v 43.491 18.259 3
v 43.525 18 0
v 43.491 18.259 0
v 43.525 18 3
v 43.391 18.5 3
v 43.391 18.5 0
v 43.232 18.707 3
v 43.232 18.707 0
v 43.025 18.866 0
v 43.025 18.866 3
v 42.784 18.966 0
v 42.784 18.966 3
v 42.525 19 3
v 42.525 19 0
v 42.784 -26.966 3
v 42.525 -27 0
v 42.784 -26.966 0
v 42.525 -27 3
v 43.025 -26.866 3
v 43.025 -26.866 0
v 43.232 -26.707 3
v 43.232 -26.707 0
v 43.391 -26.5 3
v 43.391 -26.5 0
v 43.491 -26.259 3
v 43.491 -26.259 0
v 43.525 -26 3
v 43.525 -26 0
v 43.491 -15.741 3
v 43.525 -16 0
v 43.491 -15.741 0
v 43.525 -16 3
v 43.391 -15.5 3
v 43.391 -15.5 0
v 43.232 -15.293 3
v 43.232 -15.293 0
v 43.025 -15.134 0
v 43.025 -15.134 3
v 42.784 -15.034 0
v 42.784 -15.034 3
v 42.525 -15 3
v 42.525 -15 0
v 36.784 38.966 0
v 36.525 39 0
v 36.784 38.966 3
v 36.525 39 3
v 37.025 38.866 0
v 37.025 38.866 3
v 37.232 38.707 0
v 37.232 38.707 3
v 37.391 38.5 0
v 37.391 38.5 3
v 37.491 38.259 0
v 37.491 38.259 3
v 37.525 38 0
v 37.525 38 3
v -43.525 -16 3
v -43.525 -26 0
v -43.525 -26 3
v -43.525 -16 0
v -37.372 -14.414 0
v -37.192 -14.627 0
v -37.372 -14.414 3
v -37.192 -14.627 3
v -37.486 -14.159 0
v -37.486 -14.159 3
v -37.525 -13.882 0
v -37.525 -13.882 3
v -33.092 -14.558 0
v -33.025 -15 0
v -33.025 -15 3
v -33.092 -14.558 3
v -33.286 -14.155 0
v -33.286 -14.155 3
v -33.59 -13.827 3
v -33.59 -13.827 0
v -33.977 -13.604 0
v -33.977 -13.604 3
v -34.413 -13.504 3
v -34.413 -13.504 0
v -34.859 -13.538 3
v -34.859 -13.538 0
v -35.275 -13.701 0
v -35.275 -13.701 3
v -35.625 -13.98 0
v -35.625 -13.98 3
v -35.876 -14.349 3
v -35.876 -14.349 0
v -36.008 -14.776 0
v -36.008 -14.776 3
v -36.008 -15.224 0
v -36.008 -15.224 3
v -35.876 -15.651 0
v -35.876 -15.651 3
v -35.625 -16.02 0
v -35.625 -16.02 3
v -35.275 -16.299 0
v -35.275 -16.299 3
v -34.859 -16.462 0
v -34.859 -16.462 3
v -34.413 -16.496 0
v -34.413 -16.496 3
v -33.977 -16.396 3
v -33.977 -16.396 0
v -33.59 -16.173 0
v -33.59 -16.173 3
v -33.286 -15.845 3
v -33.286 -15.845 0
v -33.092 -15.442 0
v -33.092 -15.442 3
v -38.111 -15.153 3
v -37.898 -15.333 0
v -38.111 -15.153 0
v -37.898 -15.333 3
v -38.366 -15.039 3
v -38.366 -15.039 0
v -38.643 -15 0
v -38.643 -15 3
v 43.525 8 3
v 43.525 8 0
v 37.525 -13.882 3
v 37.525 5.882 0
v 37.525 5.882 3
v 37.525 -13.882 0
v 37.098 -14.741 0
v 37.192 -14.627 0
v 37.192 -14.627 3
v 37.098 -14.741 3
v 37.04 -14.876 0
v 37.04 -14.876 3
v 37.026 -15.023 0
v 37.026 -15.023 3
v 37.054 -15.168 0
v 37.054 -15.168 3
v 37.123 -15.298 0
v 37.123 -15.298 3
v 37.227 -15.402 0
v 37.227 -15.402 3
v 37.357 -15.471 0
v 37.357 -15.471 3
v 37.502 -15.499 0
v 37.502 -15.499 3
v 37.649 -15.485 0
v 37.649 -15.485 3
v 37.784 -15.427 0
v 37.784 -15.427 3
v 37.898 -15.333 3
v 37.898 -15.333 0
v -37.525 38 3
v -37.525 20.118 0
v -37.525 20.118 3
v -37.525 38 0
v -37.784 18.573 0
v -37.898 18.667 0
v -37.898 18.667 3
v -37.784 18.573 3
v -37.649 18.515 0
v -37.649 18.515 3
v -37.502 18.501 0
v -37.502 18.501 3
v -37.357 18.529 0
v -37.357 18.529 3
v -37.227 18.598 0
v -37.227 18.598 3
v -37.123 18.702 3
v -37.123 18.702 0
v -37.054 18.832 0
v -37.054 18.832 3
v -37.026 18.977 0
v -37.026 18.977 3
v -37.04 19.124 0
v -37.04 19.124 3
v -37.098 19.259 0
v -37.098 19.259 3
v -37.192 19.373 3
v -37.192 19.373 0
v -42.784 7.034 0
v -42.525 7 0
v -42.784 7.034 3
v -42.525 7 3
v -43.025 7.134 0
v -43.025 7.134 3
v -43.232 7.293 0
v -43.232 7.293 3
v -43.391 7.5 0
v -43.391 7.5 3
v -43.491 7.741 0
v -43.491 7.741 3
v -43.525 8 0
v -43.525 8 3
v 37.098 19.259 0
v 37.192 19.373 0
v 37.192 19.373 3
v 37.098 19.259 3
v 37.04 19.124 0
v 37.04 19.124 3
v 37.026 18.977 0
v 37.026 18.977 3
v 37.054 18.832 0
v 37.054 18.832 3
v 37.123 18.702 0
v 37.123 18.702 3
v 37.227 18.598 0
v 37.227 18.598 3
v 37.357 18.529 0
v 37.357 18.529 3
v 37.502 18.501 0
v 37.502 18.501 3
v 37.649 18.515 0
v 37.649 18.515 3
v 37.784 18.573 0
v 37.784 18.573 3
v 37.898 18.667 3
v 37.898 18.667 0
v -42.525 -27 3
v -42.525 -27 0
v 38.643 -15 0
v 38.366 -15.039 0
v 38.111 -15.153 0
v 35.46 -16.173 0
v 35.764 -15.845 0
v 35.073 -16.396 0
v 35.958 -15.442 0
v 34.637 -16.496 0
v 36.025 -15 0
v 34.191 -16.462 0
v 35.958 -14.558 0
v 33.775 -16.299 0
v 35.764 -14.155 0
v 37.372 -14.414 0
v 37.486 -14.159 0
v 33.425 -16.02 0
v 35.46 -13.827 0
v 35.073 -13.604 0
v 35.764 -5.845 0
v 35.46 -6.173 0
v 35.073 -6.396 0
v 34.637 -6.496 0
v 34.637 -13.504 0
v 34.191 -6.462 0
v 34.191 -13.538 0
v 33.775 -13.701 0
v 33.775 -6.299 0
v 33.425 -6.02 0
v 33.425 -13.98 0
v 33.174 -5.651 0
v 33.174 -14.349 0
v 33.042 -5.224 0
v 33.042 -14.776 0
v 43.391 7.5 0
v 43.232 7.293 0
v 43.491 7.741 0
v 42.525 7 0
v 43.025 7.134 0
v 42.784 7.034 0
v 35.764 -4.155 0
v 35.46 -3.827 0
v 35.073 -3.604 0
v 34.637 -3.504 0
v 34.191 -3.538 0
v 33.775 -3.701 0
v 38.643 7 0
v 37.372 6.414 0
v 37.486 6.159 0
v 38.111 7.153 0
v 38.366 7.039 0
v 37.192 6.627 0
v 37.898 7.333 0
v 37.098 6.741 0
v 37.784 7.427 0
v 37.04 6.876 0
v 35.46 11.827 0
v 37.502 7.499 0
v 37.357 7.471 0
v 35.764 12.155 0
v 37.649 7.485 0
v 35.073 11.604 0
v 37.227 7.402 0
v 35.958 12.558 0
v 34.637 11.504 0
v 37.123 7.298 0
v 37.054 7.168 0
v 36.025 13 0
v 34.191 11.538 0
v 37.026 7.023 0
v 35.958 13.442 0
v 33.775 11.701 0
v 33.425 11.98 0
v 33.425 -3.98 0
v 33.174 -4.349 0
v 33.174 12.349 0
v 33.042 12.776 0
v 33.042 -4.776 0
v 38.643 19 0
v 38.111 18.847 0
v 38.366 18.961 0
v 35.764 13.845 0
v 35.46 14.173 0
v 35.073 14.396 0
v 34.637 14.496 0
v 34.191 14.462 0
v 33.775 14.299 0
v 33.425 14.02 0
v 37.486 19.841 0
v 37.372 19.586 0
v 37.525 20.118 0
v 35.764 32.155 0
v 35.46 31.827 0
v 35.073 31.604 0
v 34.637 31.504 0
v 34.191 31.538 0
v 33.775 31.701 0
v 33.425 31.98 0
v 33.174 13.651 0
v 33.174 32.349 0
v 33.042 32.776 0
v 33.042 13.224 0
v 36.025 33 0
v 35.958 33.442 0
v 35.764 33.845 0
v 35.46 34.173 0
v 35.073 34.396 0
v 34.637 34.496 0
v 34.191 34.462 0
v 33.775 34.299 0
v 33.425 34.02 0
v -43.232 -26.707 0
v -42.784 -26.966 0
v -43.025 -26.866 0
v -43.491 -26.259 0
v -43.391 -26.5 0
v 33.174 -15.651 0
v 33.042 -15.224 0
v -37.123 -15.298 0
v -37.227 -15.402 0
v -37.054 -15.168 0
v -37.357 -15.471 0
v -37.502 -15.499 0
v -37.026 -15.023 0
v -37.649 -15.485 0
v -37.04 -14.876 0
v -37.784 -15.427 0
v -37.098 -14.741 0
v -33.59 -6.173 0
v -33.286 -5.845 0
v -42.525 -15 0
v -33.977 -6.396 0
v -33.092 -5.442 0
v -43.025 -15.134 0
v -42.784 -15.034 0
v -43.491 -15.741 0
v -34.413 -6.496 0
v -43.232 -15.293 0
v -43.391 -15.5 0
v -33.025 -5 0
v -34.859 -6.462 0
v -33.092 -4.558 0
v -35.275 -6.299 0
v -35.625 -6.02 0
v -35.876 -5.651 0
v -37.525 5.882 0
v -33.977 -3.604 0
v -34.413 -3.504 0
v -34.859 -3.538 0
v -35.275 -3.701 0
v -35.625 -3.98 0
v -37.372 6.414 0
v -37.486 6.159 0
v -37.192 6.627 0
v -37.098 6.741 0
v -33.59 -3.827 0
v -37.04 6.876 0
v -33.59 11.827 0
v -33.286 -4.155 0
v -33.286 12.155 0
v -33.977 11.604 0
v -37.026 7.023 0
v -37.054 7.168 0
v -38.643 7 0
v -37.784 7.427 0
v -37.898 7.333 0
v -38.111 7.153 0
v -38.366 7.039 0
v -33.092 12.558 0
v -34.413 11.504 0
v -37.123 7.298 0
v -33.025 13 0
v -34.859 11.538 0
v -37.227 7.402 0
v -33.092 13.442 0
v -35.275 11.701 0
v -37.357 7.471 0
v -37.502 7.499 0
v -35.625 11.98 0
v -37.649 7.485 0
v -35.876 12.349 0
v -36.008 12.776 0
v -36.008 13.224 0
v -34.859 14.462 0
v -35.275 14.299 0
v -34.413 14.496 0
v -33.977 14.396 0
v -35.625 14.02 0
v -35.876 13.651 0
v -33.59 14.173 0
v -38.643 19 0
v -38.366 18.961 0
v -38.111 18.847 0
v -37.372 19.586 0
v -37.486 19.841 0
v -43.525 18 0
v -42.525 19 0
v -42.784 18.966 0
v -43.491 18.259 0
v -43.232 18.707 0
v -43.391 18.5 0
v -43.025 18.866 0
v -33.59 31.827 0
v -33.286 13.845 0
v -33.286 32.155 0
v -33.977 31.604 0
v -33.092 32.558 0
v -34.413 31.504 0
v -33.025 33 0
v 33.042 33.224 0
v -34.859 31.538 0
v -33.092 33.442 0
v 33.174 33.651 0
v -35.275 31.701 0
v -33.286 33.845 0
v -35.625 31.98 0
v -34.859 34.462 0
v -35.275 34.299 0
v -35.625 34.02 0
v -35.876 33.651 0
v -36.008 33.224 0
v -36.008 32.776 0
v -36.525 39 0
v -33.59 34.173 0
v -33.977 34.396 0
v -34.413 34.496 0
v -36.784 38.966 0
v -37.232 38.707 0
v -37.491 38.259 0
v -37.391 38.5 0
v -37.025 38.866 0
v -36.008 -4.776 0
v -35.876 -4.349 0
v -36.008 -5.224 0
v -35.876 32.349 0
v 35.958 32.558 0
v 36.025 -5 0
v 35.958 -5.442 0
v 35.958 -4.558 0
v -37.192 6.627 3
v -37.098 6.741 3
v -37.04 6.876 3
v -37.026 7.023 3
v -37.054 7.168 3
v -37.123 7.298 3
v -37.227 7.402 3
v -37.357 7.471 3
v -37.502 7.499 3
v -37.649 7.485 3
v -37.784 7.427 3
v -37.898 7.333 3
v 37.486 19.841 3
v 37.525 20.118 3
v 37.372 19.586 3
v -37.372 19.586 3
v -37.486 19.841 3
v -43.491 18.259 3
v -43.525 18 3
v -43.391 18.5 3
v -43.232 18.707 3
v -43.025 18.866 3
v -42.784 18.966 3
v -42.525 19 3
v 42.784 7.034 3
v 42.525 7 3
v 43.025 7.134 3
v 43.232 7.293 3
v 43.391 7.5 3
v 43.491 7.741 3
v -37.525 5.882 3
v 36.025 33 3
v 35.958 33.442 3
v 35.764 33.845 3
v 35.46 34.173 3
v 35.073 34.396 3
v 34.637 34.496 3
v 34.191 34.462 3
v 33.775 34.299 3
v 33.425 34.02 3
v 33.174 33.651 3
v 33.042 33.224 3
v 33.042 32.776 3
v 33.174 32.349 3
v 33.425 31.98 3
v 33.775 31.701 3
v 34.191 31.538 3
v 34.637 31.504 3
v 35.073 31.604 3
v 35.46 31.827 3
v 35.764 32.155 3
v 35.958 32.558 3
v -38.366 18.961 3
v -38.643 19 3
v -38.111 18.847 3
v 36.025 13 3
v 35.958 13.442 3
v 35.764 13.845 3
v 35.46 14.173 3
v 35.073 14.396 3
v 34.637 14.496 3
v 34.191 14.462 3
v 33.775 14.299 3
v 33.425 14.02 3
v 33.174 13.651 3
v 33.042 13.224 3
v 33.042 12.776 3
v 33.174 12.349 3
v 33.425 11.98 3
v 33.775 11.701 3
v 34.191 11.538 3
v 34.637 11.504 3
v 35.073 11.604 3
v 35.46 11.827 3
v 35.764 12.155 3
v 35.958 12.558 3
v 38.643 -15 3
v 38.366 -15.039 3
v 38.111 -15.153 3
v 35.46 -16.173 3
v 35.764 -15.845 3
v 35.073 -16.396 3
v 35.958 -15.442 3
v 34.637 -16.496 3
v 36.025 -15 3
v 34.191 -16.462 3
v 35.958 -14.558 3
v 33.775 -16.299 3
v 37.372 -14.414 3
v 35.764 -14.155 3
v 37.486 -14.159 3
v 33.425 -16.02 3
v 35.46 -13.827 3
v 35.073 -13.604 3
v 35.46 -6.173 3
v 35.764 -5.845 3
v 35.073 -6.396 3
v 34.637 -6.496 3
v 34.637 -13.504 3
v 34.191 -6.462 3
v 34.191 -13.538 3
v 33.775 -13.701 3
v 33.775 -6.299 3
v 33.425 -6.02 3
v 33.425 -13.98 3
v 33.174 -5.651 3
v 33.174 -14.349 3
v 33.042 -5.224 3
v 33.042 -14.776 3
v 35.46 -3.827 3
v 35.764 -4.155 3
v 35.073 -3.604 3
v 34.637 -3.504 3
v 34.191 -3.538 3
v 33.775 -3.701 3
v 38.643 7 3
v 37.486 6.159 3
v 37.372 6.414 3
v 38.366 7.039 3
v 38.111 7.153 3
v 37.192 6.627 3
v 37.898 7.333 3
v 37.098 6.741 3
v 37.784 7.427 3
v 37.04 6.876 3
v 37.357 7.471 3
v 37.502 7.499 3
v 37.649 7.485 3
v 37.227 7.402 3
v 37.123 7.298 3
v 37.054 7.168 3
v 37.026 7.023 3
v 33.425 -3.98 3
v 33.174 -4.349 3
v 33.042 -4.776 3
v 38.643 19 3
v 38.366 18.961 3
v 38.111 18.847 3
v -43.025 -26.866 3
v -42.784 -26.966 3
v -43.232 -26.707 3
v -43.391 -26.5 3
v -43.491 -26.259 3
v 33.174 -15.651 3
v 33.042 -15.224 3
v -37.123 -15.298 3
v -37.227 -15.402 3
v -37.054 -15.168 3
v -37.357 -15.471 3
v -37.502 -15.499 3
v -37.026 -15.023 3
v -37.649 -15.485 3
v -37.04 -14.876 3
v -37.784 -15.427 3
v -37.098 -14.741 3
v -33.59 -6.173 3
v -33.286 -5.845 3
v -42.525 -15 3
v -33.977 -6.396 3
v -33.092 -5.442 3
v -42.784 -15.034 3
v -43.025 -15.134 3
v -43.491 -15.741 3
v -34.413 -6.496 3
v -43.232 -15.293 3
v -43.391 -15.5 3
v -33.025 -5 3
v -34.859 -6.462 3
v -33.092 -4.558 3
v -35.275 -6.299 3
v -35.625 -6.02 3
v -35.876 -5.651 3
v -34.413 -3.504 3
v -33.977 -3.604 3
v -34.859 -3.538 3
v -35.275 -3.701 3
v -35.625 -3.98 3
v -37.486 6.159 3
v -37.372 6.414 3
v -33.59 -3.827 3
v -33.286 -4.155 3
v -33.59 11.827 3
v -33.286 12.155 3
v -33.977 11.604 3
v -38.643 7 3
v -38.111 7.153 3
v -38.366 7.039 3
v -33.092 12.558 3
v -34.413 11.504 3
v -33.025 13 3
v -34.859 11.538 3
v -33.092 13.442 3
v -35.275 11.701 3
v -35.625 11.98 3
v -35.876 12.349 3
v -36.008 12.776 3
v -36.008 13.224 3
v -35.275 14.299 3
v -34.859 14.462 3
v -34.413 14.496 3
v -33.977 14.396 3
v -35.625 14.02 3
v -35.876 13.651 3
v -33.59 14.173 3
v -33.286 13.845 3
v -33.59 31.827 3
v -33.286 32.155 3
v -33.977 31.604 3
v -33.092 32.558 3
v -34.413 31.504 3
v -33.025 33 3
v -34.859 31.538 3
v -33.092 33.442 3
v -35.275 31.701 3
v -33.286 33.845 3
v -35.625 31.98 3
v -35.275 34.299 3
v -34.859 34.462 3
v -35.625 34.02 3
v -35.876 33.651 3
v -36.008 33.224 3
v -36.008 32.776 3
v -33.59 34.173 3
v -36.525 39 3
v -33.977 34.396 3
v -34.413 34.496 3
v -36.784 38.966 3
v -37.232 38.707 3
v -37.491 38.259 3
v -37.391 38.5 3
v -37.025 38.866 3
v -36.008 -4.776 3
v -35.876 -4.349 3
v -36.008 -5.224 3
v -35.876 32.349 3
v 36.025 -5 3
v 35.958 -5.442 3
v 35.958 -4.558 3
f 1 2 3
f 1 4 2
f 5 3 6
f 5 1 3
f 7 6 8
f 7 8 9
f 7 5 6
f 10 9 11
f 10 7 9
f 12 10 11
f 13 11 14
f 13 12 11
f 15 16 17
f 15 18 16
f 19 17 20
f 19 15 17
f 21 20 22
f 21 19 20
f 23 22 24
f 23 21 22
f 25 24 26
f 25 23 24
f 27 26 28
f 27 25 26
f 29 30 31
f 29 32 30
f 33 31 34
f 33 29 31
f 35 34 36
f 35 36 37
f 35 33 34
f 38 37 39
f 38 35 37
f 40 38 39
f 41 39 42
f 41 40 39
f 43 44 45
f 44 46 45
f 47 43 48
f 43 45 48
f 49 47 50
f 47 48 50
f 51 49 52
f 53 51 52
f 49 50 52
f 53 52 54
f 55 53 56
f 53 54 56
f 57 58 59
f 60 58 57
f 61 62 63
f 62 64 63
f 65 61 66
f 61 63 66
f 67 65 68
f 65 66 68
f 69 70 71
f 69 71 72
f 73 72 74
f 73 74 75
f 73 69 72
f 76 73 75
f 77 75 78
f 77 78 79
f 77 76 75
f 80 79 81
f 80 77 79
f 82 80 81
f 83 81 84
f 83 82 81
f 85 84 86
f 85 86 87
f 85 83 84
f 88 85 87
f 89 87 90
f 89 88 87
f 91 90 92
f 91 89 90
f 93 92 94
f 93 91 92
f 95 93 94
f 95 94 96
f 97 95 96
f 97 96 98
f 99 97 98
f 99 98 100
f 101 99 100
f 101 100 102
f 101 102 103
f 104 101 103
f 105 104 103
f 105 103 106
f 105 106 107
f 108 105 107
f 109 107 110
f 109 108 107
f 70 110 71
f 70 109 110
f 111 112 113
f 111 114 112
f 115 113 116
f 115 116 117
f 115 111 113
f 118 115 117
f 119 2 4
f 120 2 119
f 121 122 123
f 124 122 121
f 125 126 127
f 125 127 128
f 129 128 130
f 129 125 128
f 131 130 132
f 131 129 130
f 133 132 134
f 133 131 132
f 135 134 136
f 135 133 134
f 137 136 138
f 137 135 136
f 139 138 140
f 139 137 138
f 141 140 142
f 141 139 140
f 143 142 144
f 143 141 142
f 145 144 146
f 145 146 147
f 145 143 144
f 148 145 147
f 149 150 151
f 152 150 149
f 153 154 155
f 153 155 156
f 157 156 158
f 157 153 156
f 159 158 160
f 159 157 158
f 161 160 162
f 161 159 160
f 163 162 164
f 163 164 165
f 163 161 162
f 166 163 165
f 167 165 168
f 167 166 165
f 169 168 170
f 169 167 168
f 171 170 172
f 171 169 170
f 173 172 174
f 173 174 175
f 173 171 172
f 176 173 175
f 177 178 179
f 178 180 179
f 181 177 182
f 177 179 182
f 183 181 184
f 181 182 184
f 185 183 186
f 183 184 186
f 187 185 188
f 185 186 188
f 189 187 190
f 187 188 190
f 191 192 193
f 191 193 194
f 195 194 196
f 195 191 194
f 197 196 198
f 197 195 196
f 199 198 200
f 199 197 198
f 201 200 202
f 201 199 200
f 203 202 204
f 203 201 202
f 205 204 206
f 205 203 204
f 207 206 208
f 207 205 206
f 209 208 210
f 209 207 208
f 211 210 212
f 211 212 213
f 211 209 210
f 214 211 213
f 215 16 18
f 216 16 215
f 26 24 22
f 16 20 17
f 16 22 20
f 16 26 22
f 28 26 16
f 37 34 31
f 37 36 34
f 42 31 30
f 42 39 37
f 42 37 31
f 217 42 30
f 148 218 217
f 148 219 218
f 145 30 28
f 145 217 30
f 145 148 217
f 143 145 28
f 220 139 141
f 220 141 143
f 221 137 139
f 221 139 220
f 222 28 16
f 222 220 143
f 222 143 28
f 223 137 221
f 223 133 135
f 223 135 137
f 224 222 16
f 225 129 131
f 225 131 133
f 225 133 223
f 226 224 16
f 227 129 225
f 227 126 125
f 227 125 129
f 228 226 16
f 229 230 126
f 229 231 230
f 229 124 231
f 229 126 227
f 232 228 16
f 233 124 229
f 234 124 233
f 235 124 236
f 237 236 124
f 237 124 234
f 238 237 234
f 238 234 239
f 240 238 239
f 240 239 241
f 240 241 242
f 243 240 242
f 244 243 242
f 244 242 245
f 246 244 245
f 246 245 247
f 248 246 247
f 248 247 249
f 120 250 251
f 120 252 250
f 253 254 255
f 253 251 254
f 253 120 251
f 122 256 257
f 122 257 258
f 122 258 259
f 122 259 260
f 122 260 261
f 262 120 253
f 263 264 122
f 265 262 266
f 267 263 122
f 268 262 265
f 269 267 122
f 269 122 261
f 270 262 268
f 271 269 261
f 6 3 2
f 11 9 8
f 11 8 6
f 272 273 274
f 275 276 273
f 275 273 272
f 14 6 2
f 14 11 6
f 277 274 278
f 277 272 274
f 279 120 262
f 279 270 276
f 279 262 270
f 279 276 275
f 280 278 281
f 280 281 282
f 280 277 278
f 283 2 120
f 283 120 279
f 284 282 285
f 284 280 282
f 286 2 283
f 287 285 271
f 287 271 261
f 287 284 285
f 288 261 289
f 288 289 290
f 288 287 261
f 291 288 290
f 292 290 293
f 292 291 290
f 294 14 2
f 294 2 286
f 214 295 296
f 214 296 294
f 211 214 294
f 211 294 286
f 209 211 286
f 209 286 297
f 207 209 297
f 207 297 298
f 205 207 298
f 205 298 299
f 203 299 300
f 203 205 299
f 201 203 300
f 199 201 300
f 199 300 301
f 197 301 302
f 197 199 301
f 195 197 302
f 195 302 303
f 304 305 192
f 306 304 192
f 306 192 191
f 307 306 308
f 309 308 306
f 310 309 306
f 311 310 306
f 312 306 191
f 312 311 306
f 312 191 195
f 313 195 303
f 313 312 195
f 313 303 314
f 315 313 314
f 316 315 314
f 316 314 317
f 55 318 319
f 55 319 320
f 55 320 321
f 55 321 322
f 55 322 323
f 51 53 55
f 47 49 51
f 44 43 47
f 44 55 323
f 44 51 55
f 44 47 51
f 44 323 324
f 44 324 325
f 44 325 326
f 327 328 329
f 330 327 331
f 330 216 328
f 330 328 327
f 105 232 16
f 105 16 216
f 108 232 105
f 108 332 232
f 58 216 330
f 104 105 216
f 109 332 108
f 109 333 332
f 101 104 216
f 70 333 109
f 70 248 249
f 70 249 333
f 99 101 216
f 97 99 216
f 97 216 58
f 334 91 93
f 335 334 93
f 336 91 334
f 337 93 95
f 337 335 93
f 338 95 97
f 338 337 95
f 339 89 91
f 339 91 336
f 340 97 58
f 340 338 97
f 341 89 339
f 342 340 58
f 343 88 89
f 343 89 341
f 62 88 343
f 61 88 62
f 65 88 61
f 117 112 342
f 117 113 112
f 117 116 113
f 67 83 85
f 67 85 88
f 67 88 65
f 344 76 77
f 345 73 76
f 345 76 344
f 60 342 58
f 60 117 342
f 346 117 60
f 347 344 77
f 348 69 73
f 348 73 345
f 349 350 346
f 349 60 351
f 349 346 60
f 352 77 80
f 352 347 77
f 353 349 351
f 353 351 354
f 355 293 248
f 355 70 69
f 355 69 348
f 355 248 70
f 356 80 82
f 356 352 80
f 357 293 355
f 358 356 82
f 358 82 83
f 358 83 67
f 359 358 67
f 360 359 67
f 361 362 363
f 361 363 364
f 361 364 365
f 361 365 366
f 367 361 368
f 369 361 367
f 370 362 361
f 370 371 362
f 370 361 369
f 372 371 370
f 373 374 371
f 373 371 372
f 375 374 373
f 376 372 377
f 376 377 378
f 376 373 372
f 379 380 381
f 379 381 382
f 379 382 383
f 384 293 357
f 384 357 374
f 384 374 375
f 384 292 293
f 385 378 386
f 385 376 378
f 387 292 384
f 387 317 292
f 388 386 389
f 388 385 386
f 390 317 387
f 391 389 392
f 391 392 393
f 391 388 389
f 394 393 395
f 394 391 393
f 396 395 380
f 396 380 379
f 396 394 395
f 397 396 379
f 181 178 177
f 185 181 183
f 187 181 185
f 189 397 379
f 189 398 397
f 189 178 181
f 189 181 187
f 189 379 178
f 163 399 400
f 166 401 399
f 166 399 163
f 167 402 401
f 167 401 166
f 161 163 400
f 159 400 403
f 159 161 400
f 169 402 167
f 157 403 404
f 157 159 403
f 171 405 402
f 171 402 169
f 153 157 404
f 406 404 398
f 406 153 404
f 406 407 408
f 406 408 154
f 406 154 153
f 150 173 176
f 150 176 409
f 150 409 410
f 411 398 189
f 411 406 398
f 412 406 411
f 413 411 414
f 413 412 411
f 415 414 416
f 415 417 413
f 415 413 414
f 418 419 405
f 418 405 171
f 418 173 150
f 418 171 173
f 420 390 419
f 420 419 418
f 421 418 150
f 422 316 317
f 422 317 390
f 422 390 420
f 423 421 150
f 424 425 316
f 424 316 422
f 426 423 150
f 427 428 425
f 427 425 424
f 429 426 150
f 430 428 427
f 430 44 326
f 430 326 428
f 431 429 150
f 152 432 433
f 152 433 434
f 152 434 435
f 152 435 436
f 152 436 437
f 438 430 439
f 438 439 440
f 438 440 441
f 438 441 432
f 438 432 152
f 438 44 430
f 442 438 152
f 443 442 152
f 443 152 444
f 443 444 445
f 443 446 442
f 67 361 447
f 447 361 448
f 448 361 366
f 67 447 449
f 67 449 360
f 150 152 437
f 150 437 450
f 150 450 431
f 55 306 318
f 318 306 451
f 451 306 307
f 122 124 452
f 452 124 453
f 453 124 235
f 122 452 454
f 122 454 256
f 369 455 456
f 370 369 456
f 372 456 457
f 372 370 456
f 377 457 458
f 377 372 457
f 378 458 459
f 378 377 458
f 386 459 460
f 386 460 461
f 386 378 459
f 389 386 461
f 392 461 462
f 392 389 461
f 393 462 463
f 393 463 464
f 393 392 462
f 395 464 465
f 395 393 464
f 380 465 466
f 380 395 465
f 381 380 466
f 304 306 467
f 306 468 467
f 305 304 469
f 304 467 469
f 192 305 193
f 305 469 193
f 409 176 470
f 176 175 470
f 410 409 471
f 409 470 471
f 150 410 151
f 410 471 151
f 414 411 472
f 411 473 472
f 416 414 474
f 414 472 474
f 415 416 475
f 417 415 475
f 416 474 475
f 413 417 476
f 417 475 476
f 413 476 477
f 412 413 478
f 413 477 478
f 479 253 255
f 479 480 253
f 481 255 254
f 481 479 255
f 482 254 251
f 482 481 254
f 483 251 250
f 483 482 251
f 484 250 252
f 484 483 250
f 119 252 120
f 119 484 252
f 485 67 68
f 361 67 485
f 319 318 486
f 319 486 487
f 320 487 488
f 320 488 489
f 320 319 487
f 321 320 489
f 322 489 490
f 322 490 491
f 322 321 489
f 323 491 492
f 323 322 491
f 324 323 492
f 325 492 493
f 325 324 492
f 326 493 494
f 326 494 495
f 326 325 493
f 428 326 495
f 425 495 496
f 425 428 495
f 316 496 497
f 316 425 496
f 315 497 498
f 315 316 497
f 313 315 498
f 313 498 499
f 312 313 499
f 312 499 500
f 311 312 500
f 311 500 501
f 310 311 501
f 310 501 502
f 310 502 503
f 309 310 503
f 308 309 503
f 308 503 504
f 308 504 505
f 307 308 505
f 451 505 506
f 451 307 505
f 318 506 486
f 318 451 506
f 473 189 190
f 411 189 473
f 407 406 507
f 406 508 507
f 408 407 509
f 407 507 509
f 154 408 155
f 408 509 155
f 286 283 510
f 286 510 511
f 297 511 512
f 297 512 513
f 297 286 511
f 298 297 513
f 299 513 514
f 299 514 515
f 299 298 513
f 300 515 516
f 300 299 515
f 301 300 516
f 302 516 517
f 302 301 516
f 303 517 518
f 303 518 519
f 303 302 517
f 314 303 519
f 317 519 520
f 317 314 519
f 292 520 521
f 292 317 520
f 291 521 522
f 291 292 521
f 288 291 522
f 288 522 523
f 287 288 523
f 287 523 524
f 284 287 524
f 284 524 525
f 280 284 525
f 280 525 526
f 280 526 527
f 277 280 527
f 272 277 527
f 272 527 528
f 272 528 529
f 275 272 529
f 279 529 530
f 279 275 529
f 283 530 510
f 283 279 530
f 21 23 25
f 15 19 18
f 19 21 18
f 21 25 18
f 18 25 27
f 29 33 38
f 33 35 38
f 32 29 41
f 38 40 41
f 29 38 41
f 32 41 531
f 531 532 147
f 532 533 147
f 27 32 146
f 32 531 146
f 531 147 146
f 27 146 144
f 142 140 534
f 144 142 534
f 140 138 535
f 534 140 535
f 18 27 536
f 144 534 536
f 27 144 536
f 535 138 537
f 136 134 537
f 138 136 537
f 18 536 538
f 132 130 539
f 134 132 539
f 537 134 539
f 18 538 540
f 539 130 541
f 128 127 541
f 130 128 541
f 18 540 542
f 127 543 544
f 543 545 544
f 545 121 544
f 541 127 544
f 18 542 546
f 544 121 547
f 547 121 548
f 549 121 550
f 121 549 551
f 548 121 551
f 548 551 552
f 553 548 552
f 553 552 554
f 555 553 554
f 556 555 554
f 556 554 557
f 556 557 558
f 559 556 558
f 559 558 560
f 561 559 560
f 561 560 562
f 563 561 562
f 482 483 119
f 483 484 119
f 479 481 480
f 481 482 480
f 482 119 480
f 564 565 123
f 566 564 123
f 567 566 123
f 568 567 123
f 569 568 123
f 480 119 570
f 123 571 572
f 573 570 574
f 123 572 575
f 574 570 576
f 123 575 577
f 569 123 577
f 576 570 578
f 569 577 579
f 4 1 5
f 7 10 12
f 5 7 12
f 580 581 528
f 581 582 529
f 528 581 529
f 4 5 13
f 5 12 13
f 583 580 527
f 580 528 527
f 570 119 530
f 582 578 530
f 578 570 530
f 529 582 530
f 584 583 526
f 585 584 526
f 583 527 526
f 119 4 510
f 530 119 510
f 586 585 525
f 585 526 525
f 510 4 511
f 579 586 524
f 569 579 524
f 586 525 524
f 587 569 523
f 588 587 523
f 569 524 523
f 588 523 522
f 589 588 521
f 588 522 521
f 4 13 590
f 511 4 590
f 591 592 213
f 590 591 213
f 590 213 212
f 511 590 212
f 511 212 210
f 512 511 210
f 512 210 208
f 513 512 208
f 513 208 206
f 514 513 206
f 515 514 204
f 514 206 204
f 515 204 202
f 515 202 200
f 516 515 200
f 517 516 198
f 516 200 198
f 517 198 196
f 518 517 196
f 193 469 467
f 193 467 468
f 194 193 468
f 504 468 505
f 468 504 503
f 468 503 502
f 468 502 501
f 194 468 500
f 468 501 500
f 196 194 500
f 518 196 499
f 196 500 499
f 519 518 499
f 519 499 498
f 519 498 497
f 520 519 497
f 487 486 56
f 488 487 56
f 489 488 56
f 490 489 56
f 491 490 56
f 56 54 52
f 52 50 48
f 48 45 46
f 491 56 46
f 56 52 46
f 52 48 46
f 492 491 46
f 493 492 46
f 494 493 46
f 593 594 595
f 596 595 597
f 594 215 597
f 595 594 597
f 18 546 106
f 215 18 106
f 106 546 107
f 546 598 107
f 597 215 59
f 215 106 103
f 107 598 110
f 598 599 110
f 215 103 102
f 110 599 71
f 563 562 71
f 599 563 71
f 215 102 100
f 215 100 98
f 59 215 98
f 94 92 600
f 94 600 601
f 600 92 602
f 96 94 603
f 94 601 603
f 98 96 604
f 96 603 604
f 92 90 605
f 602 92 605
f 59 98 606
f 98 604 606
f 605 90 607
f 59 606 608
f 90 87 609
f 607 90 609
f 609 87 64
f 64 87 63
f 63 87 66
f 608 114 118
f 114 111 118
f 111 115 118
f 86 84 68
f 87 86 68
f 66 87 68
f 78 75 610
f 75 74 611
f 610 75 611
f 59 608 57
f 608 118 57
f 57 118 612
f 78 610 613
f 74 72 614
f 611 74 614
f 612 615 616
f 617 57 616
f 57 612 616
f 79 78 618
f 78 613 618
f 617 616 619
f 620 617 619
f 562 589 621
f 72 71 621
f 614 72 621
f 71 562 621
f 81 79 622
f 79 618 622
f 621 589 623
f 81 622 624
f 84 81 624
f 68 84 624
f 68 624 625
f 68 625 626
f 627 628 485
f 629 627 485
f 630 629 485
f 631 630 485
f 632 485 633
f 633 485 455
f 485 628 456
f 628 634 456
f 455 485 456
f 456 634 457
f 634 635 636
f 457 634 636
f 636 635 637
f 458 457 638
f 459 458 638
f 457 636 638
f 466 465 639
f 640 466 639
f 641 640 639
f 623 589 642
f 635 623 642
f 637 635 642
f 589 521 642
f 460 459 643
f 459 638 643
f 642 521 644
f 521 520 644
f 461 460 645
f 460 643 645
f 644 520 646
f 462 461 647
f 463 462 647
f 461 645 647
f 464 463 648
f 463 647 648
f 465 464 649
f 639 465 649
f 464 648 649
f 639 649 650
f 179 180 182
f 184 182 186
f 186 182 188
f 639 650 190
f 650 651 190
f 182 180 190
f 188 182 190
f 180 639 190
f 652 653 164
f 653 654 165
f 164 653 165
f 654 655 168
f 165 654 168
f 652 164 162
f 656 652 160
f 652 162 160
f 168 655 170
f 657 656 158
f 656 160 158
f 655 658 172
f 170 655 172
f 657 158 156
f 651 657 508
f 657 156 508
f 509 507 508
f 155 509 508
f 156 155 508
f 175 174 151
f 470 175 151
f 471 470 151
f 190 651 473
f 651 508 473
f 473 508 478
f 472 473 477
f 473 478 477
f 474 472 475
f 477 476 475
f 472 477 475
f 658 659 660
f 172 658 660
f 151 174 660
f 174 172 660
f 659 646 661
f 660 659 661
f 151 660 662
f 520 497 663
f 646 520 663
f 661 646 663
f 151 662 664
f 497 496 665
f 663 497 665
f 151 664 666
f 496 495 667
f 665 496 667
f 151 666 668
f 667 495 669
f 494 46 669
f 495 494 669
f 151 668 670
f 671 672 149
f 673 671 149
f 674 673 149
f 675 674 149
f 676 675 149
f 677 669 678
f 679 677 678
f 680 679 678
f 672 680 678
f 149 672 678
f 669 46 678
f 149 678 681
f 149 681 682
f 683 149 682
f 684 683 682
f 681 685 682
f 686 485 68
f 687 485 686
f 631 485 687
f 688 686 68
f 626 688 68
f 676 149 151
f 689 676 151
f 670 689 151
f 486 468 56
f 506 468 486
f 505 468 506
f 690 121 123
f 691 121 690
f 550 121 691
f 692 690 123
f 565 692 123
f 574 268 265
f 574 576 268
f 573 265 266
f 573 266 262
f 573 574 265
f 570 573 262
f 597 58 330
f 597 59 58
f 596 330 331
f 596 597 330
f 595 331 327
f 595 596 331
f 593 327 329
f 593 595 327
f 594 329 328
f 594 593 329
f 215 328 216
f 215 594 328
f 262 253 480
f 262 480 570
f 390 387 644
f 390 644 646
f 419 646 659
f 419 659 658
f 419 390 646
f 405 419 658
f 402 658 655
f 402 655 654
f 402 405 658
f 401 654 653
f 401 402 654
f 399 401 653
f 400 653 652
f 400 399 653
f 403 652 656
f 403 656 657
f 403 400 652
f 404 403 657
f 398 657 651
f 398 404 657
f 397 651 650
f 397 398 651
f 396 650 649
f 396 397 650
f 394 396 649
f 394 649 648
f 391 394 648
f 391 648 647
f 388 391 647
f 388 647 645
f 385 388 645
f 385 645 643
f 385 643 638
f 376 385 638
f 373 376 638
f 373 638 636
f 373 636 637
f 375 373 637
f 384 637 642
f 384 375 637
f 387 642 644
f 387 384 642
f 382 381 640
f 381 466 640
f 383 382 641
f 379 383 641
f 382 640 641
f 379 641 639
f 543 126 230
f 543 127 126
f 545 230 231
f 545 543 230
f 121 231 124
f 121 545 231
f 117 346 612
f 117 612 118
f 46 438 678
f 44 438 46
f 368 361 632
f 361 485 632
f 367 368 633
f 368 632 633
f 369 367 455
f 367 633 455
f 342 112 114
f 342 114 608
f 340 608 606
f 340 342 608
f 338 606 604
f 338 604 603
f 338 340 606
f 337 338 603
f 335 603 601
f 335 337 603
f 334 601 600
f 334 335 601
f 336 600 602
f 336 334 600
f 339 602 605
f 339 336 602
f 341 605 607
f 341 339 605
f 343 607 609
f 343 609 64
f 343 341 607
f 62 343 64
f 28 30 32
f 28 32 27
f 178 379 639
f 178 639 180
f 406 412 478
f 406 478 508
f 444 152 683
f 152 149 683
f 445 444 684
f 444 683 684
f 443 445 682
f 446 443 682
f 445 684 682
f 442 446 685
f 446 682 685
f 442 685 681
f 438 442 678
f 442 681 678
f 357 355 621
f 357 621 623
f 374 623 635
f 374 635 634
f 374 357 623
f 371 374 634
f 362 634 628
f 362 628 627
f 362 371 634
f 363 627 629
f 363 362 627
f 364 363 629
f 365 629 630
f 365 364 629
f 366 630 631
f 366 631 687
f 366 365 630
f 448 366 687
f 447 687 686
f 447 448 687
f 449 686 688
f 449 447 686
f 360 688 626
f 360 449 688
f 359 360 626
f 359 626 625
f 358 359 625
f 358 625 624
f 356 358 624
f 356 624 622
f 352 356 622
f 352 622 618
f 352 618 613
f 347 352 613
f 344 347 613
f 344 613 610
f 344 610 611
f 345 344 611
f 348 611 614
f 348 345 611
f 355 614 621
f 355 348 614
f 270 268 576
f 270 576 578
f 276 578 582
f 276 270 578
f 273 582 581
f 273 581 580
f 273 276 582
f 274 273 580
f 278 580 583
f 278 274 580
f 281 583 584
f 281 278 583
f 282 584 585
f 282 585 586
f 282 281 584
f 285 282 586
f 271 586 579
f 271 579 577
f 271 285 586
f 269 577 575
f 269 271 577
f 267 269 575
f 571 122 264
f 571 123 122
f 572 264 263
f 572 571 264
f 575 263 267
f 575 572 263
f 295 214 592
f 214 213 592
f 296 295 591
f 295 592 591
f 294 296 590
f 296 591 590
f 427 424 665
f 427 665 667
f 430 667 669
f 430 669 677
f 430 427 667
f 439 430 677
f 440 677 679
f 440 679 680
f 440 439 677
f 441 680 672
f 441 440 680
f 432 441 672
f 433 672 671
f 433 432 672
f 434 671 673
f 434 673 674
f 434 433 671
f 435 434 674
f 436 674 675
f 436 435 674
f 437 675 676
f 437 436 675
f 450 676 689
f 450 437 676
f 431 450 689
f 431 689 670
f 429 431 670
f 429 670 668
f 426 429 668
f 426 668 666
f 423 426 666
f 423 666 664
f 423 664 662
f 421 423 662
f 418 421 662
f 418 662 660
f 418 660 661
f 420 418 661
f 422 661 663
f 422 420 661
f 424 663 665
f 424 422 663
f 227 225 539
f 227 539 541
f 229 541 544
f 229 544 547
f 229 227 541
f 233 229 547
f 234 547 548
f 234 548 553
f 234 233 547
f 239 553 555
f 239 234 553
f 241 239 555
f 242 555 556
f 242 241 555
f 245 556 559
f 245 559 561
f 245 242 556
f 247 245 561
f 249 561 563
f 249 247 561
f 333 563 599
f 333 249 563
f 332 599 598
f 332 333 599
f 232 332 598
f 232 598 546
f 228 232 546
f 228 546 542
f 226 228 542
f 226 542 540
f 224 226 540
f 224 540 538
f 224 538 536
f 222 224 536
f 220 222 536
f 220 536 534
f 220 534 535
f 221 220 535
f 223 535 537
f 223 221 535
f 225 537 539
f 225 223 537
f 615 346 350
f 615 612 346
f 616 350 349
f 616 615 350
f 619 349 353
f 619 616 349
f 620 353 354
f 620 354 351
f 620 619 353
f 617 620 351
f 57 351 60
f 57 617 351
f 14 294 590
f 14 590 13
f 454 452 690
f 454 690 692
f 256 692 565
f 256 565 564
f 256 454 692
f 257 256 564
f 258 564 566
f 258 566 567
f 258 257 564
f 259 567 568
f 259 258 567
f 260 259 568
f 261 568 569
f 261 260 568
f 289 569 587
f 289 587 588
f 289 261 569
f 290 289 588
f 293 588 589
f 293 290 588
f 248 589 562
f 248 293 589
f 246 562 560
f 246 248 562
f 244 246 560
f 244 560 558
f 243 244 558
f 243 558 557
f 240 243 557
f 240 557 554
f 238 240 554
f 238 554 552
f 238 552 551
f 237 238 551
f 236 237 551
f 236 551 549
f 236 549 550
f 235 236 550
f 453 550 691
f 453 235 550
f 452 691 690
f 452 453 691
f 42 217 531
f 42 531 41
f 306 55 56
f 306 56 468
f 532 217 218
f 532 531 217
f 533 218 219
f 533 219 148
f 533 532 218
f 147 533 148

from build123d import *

# Parameters (mm, degrees)
SKETCH_1_R      = 1.5
EXTRUDE_1_DEPTH = 3
FILLET_1_R      = 1


with BuildPart() as part:
    # 草图1 → 凸台-拉伸1 (new body)
    with BuildSketch(Plane.XY):
        with BuildLine():
            ThreePointArc((-38.025, -15), (-37.171446609, -15.353553391), (-37.525, -14.5))
            Line((-37.525, -14.5), (-37.525, 6.5))
            ThreePointArc((-37.525, 6.5), (-37.171446609, 7.353553391), (-38.025, 7))
            Line((-38.025, 7), (-43.525, 7))
            Line((-43.525, 7), (-43.525, 19))
            Line((-43.525, 19), (-38.025, 19))
            ThreePointArc((-38.025, 19), (-37.171446609, 18.646446609), (-37.525, 19.5))
            Line((-37.525, 19.5), (-37.525, 39))
            Line((-37.525, 39), (37.525, 39))
            Line((37.525, 39), (37.525, 19.5))
            ThreePointArc((37.525, 19.5), (37.171446609, 18.646446609), (38.025, 19))
            Line((38.025, 19), (43.525, 19))
            Line((43.525, 19), (43.525, 7))
            Line((43.525, 7), (38.025, 7))
            ThreePointArc((38.025, 7), (37.171446609, 7.353553391), (37.525, 6.5))
            Line((37.525, 6.5), (37.525, -14.5))
            ThreePointArc((37.525, -14.5), (37.171446609, -15.353553391), (38.025, -15))
            Line((38.025, -15), (43.525, -15))
            Line((43.525, -15), (43.525, -27))
            Line((43.525, -27), (37.525, -27))
            Line((37.525, -27), (-37.525, -27))
            Line((-37.525, -27), (-43.525, -27))
            Line((-43.525, -27), (-43.525, -15))
            Line((-43.525, -15), (-38.025, -15))
        make_face()
        with Locations((34.525, -5)):
            Circle(SKETCH_1_R, mode=Mode.SUBTRACT)
        with Locations((34.525, 33)):
            Circle(SKETCH_1_R, mode=Mode.SUBTRACT)
        with Locations((-34.525, -15)):
            Circle(SKETCH_1_R, mode=Mode.SUBTRACT)
        with Locations((-34.525, -5)):
            Circle(SKETCH_1_R, mode=Mode.SUBTRACT)
        with Locations((-34.525, 13)):
            Circle(SKETCH_1_R, mode=Mode.SUBTRACT)
        with Locations((-34.525, 33)):
            Circle(SKETCH_1_R, mode=Mode.SUBTRACT)
        with Locations((34.525, 13)):
            Circle(SKETCH_1_R, mode=Mode.SUBTRACT)
        with Locations((34.525, -15)):
            Circle(SKETCH_1_R, mode=Mode.SUBTRACT)
    extrude(amount=EXTRUDE_1_DEPTH)

    # 圆角1
    fillet_1_edges = [part.edges().sort_by_distance(p)[0] for p in [
        (-37.525, -14.5, 1.5),
        (-37.525, 6.5, 1.5),
        (-38.025, 7, 1.5),
        (-43.525, 7, 1.5),
        (-43.525, 19, 1.5),
        (-38.025, 19, 1.5),
        (-37.525, 19.5, 1.5),
        (-37.525, 39, 1.5),
        (37.525, 39, 1.5),
        (37.525, 19.5, 1.5),
        (38.025, 19, 1.5),
        (43.525, 19, 1.5),
        (43.525, 7, 1.5),
        (38.025, 7, 1.5),
        (37.525, 6.5, 1.5),
        (37.525, -14.5, 1.5),
        (38.025, -15, 1.5),
        (43.525, -15, 1.5),
        (43.525, -27, 1.5),
        (-43.525, -27, 1.5),
        (-43.525, -15, 1.5),
        (-38.025, -15, 1.5),
    ]]
    fillet(fillet_1_edges, radius=FILLET_1_R)


solid = part.part
